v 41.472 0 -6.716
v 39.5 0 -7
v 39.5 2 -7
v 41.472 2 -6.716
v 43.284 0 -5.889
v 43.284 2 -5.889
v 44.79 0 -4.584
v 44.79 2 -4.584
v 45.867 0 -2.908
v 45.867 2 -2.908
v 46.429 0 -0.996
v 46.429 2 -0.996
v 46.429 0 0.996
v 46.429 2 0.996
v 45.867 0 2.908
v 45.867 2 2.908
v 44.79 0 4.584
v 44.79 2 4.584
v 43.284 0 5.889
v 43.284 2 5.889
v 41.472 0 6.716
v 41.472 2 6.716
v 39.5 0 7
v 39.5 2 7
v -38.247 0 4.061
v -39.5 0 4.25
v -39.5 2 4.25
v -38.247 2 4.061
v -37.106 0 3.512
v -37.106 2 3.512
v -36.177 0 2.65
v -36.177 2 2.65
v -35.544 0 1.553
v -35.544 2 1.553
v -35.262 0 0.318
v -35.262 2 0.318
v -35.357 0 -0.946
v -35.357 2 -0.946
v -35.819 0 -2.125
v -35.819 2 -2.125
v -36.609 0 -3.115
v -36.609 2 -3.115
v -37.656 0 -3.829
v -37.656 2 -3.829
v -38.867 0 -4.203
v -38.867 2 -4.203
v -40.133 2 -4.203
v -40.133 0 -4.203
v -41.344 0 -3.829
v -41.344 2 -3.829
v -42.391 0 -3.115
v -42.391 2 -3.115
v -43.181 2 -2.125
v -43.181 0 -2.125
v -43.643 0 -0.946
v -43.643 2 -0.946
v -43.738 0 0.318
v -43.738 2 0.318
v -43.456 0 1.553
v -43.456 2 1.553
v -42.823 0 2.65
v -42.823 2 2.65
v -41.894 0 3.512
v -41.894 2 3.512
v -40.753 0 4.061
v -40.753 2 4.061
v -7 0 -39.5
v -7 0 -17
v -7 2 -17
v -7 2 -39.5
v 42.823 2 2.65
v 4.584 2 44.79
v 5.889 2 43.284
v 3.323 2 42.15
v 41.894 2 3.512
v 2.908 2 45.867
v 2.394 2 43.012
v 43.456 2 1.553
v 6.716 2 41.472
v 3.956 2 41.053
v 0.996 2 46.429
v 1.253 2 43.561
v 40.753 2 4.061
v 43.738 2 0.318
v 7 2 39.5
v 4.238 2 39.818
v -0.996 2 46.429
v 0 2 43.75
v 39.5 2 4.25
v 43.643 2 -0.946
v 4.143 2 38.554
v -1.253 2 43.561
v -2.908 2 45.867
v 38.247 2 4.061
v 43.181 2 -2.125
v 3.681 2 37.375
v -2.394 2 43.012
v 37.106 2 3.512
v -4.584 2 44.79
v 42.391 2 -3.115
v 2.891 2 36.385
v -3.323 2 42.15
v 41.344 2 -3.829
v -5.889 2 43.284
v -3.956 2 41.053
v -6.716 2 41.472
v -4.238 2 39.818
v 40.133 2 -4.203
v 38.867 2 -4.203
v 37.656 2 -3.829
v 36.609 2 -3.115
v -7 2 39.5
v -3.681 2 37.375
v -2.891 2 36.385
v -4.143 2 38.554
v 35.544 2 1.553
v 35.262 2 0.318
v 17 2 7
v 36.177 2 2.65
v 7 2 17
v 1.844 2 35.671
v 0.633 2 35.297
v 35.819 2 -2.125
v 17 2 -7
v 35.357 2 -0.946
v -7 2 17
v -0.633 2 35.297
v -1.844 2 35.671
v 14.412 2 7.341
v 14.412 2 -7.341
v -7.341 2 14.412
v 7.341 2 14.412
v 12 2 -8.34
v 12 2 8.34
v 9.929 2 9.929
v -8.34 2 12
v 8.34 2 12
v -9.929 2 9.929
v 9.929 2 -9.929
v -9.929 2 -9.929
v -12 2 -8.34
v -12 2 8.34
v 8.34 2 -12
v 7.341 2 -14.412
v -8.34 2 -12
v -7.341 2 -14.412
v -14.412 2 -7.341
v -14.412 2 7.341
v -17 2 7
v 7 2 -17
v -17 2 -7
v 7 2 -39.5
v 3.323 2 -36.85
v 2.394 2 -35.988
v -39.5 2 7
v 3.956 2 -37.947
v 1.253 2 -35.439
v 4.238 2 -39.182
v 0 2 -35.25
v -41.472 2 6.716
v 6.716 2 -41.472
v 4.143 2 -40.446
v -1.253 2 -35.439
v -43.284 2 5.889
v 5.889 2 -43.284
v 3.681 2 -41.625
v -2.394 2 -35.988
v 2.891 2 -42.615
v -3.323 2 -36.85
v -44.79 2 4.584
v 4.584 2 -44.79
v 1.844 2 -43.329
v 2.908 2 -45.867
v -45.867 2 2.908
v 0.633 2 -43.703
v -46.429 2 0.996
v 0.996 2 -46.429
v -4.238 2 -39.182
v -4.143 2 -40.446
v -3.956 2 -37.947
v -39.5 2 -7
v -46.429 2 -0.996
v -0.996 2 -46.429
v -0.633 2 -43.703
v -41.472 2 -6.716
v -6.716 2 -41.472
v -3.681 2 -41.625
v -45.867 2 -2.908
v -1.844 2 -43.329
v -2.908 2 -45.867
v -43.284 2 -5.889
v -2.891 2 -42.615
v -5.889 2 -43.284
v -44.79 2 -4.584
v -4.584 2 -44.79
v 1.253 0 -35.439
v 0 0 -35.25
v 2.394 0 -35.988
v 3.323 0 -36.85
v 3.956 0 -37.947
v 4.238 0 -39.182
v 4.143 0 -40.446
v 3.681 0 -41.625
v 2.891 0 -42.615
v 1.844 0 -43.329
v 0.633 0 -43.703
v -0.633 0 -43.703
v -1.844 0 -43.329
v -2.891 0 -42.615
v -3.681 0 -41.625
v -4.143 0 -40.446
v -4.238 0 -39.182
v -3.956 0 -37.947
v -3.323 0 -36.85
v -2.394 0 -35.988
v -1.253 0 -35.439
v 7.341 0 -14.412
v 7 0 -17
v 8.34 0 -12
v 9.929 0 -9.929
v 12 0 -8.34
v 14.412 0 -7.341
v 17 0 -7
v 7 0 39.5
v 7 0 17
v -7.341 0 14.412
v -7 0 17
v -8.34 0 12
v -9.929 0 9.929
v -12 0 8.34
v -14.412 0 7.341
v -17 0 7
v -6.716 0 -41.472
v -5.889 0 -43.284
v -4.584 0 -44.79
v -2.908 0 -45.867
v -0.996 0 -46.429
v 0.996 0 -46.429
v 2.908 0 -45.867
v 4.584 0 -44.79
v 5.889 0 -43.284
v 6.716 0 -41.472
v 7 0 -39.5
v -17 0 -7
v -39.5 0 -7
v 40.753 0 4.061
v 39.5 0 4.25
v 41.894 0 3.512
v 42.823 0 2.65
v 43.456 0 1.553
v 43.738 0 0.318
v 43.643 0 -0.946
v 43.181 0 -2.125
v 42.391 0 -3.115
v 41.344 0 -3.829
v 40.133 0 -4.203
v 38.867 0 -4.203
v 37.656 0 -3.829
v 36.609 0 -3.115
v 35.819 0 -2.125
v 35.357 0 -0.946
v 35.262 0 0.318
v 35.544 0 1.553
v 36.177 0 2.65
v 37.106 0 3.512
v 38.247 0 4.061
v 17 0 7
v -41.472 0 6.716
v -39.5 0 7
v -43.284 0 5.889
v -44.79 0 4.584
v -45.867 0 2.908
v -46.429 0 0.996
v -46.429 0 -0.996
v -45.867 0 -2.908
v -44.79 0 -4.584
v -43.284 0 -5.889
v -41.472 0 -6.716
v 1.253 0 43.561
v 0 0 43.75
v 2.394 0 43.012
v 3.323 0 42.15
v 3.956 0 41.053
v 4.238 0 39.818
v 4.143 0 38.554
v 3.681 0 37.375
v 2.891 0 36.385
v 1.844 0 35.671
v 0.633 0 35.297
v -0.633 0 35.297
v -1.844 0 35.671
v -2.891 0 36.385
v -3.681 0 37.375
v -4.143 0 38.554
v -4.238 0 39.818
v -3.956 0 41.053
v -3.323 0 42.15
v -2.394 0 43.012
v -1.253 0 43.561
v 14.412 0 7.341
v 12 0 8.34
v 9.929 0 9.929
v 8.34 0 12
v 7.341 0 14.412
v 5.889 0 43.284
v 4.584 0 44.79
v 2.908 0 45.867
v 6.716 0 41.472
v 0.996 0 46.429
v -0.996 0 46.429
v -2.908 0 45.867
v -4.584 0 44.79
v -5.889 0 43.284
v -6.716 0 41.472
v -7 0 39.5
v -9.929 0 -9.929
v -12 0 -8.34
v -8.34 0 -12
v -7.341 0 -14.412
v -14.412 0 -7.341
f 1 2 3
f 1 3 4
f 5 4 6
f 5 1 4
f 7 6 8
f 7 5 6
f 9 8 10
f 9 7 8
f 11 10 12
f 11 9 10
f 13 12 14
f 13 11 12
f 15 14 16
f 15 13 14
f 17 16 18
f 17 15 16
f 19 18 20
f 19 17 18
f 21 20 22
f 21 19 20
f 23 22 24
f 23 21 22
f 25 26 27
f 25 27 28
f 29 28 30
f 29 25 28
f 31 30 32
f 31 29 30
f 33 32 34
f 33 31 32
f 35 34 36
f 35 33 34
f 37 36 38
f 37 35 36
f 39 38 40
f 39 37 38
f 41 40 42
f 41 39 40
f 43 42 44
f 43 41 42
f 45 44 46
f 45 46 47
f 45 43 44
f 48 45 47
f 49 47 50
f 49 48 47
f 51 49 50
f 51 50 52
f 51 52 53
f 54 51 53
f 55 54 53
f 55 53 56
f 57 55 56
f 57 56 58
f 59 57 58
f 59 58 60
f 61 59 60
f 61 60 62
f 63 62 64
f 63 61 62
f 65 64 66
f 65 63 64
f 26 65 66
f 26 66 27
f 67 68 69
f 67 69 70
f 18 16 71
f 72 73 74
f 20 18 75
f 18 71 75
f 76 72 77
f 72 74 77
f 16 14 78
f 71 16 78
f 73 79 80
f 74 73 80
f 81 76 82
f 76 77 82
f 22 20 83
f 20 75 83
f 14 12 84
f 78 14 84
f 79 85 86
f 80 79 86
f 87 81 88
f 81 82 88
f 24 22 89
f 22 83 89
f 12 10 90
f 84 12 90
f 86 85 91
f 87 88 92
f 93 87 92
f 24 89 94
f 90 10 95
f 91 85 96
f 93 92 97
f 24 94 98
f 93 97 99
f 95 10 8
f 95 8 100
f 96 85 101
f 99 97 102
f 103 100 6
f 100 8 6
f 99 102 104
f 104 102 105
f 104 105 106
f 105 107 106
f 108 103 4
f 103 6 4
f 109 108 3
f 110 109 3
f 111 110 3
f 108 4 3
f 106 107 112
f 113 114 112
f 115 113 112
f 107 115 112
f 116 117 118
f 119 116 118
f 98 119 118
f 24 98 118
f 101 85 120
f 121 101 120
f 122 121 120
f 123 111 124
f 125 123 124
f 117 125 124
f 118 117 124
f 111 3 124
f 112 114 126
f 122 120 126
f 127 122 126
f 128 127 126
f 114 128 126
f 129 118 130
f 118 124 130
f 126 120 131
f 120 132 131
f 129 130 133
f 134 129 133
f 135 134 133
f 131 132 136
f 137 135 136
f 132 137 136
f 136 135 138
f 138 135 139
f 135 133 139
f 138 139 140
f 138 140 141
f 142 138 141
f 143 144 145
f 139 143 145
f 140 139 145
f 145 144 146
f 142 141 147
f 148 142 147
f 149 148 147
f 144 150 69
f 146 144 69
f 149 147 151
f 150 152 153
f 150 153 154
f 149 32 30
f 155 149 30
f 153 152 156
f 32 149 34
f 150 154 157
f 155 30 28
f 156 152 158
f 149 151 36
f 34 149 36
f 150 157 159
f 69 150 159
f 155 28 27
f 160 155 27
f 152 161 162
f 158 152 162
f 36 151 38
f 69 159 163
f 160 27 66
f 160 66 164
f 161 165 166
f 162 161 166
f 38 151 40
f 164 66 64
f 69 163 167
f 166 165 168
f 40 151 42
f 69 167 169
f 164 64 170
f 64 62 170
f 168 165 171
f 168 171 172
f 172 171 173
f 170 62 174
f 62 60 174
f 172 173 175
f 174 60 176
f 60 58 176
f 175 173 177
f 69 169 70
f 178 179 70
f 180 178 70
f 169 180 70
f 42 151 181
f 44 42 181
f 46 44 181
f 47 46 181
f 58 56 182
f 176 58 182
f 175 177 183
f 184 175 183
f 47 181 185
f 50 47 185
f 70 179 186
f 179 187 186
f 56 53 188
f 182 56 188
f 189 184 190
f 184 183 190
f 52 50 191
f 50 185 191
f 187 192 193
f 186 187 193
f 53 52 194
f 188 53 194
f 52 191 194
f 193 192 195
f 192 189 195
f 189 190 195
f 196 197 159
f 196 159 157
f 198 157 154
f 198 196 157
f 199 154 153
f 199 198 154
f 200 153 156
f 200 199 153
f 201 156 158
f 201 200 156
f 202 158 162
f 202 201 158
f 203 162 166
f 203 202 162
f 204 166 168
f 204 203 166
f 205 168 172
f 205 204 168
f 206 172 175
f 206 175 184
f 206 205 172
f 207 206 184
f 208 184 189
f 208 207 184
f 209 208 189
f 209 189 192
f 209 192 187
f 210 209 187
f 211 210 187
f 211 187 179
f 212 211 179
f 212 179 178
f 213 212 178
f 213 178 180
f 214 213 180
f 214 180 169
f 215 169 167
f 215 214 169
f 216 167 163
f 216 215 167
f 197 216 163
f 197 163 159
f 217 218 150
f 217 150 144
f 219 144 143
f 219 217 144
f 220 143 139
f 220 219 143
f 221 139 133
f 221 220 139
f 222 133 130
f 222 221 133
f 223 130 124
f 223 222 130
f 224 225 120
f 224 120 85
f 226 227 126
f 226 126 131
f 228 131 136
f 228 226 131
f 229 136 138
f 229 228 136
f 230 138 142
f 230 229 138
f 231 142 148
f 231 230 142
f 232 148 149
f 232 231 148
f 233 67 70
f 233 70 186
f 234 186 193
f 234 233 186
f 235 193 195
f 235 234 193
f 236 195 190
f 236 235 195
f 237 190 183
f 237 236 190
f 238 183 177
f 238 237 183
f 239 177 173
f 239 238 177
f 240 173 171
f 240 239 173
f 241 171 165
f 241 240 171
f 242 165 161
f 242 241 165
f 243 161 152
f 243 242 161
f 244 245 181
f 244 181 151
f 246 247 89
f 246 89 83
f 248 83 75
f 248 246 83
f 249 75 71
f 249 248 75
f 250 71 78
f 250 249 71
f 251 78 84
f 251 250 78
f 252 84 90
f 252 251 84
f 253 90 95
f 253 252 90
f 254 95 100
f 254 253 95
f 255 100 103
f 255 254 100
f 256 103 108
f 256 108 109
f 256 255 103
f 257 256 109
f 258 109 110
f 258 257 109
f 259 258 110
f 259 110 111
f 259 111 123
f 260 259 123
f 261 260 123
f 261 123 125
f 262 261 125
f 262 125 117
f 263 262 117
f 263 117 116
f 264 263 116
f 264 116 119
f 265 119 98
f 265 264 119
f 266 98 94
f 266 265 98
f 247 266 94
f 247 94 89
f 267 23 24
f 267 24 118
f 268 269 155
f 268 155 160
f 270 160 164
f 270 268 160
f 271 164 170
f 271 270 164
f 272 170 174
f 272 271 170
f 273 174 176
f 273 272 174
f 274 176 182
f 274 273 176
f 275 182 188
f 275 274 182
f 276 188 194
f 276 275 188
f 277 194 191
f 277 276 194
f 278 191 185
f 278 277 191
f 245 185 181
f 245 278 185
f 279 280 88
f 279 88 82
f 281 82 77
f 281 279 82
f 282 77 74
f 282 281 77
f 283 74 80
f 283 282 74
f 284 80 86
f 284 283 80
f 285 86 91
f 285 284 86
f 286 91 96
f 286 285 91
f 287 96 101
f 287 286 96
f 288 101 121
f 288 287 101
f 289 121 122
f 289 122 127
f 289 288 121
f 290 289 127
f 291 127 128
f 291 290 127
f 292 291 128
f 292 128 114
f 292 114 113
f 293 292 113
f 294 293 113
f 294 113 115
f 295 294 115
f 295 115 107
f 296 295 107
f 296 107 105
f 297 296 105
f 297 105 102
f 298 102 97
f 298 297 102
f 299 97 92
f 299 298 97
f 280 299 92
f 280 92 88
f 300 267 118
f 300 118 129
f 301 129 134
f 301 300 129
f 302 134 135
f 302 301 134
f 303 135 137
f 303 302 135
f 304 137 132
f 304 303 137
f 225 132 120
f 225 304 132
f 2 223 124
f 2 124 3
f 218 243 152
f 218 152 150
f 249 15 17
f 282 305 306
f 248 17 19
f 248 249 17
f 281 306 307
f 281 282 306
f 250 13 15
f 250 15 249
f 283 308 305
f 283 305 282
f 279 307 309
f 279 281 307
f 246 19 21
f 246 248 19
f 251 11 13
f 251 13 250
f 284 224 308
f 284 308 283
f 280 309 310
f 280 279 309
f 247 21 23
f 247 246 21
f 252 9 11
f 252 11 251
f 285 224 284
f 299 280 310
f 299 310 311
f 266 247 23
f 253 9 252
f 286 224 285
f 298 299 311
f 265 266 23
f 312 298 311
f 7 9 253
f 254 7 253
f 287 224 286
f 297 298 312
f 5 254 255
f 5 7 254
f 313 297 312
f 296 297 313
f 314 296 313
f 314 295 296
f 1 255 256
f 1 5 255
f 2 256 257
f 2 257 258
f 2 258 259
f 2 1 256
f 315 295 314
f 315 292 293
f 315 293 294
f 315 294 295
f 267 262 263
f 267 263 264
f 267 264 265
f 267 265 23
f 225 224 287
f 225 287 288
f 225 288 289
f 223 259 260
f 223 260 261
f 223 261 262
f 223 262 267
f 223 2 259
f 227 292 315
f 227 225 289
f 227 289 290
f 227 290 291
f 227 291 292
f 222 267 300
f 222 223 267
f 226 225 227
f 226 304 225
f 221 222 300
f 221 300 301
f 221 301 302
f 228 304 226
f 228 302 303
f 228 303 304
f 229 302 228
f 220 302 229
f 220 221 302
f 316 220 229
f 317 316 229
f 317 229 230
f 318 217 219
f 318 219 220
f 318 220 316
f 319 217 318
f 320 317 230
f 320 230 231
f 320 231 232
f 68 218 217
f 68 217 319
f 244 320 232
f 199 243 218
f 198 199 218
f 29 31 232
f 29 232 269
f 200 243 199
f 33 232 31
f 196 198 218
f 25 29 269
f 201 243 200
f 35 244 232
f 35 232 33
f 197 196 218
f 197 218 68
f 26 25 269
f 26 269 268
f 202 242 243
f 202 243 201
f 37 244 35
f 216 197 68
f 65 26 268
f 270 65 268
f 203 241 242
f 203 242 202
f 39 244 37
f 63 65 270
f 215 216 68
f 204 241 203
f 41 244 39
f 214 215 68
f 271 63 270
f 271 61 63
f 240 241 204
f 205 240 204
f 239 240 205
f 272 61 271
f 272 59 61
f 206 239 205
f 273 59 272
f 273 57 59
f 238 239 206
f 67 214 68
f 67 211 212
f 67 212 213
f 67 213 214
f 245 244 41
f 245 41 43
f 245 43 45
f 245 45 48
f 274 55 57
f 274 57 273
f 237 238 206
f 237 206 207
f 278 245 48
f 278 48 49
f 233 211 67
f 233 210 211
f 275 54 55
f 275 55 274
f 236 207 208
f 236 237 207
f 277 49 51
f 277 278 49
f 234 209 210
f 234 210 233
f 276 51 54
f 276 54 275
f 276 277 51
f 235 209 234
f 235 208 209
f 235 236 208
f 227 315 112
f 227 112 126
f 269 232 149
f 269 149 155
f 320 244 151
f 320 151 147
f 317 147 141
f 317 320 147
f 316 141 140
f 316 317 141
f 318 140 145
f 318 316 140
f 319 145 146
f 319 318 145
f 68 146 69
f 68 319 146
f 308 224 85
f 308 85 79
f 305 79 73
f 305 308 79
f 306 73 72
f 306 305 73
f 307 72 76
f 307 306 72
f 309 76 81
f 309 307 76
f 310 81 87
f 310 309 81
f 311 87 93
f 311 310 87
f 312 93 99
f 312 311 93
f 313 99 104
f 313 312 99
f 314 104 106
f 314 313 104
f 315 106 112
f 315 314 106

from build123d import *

# Parameters (mm, degrees)
SKETCH1_R           = 4.25
BOSS_EXTRUDE1_DEPTH = 2


with BuildPart() as part:
    # Sketch1 → Boss-Extrude1 (new body)
    with BuildSketch(Plane(origin=(0, 0, 0), x_dir=(1, 0, 0), z_dir=(0, 1, 0))):
        with BuildLine():
            Line((-39.5, 7), (-17, 7))
            ThreePointArc((-17, 7), (-9.928932188, 9.928932188), (-7, 17))
            Line((-7, 17), (-7, 39.5))
            ThreePointArc((-7, 39.5), (0, 46.5), (7, 39.5))
            Line((7, 39.5), (7, 17))
            ThreePointArc((7, 17), (9.928932188, 9.928932188), (17, 7))
            Line((17, 7), (39.5, 7))
            ThreePointArc((39.5, 7), (46.5, 0), (39.5, -7))
            Line((39.5, -7), (17, -7))
            ThreePointArc((17, -7), (9.928932188, -9.928932188), (7, -17))
            Line((7, -17), (7, -39.5))
            ThreePointArc((7, -39.5), (0, -46.5), (-7, -39.5))
            Line((-7, -39.5), (-7, -17))
            ThreePointArc((-7, -17), (-9.928932188, -9.928932188), (-17, -7))
            Line((-17, -7), (-39.5, -7))
            ThreePointArc((-39.5, -7), (-46.5, 0), (-39.5, 7))
        make_face()
        with Locations(Location((0, 39.5, 0), (0, 0, 270))):
            Circle(SKETCH1_R, mode=Mode.SUBTRACT)
        with Locations(Location((39.5, 0, 0), (0, 0, 270))):
            Circle(SKETCH1_R, mode=Mode.SUBTRACT)
        with Locations(Location((0, -39.5, 0), (0, 0, 270))):
            Circle(SKETCH1_R, mode=Mode.SUBTRACT)
        with Locations(Location((-39.5, 0, 0), (0, 0, 270))):
            Circle(SKETCH1_R, mode=Mode.SUBTRACT)
    extrude(amount=BOSS_EXTRUDE1_DEPTH)


solid = part.part
